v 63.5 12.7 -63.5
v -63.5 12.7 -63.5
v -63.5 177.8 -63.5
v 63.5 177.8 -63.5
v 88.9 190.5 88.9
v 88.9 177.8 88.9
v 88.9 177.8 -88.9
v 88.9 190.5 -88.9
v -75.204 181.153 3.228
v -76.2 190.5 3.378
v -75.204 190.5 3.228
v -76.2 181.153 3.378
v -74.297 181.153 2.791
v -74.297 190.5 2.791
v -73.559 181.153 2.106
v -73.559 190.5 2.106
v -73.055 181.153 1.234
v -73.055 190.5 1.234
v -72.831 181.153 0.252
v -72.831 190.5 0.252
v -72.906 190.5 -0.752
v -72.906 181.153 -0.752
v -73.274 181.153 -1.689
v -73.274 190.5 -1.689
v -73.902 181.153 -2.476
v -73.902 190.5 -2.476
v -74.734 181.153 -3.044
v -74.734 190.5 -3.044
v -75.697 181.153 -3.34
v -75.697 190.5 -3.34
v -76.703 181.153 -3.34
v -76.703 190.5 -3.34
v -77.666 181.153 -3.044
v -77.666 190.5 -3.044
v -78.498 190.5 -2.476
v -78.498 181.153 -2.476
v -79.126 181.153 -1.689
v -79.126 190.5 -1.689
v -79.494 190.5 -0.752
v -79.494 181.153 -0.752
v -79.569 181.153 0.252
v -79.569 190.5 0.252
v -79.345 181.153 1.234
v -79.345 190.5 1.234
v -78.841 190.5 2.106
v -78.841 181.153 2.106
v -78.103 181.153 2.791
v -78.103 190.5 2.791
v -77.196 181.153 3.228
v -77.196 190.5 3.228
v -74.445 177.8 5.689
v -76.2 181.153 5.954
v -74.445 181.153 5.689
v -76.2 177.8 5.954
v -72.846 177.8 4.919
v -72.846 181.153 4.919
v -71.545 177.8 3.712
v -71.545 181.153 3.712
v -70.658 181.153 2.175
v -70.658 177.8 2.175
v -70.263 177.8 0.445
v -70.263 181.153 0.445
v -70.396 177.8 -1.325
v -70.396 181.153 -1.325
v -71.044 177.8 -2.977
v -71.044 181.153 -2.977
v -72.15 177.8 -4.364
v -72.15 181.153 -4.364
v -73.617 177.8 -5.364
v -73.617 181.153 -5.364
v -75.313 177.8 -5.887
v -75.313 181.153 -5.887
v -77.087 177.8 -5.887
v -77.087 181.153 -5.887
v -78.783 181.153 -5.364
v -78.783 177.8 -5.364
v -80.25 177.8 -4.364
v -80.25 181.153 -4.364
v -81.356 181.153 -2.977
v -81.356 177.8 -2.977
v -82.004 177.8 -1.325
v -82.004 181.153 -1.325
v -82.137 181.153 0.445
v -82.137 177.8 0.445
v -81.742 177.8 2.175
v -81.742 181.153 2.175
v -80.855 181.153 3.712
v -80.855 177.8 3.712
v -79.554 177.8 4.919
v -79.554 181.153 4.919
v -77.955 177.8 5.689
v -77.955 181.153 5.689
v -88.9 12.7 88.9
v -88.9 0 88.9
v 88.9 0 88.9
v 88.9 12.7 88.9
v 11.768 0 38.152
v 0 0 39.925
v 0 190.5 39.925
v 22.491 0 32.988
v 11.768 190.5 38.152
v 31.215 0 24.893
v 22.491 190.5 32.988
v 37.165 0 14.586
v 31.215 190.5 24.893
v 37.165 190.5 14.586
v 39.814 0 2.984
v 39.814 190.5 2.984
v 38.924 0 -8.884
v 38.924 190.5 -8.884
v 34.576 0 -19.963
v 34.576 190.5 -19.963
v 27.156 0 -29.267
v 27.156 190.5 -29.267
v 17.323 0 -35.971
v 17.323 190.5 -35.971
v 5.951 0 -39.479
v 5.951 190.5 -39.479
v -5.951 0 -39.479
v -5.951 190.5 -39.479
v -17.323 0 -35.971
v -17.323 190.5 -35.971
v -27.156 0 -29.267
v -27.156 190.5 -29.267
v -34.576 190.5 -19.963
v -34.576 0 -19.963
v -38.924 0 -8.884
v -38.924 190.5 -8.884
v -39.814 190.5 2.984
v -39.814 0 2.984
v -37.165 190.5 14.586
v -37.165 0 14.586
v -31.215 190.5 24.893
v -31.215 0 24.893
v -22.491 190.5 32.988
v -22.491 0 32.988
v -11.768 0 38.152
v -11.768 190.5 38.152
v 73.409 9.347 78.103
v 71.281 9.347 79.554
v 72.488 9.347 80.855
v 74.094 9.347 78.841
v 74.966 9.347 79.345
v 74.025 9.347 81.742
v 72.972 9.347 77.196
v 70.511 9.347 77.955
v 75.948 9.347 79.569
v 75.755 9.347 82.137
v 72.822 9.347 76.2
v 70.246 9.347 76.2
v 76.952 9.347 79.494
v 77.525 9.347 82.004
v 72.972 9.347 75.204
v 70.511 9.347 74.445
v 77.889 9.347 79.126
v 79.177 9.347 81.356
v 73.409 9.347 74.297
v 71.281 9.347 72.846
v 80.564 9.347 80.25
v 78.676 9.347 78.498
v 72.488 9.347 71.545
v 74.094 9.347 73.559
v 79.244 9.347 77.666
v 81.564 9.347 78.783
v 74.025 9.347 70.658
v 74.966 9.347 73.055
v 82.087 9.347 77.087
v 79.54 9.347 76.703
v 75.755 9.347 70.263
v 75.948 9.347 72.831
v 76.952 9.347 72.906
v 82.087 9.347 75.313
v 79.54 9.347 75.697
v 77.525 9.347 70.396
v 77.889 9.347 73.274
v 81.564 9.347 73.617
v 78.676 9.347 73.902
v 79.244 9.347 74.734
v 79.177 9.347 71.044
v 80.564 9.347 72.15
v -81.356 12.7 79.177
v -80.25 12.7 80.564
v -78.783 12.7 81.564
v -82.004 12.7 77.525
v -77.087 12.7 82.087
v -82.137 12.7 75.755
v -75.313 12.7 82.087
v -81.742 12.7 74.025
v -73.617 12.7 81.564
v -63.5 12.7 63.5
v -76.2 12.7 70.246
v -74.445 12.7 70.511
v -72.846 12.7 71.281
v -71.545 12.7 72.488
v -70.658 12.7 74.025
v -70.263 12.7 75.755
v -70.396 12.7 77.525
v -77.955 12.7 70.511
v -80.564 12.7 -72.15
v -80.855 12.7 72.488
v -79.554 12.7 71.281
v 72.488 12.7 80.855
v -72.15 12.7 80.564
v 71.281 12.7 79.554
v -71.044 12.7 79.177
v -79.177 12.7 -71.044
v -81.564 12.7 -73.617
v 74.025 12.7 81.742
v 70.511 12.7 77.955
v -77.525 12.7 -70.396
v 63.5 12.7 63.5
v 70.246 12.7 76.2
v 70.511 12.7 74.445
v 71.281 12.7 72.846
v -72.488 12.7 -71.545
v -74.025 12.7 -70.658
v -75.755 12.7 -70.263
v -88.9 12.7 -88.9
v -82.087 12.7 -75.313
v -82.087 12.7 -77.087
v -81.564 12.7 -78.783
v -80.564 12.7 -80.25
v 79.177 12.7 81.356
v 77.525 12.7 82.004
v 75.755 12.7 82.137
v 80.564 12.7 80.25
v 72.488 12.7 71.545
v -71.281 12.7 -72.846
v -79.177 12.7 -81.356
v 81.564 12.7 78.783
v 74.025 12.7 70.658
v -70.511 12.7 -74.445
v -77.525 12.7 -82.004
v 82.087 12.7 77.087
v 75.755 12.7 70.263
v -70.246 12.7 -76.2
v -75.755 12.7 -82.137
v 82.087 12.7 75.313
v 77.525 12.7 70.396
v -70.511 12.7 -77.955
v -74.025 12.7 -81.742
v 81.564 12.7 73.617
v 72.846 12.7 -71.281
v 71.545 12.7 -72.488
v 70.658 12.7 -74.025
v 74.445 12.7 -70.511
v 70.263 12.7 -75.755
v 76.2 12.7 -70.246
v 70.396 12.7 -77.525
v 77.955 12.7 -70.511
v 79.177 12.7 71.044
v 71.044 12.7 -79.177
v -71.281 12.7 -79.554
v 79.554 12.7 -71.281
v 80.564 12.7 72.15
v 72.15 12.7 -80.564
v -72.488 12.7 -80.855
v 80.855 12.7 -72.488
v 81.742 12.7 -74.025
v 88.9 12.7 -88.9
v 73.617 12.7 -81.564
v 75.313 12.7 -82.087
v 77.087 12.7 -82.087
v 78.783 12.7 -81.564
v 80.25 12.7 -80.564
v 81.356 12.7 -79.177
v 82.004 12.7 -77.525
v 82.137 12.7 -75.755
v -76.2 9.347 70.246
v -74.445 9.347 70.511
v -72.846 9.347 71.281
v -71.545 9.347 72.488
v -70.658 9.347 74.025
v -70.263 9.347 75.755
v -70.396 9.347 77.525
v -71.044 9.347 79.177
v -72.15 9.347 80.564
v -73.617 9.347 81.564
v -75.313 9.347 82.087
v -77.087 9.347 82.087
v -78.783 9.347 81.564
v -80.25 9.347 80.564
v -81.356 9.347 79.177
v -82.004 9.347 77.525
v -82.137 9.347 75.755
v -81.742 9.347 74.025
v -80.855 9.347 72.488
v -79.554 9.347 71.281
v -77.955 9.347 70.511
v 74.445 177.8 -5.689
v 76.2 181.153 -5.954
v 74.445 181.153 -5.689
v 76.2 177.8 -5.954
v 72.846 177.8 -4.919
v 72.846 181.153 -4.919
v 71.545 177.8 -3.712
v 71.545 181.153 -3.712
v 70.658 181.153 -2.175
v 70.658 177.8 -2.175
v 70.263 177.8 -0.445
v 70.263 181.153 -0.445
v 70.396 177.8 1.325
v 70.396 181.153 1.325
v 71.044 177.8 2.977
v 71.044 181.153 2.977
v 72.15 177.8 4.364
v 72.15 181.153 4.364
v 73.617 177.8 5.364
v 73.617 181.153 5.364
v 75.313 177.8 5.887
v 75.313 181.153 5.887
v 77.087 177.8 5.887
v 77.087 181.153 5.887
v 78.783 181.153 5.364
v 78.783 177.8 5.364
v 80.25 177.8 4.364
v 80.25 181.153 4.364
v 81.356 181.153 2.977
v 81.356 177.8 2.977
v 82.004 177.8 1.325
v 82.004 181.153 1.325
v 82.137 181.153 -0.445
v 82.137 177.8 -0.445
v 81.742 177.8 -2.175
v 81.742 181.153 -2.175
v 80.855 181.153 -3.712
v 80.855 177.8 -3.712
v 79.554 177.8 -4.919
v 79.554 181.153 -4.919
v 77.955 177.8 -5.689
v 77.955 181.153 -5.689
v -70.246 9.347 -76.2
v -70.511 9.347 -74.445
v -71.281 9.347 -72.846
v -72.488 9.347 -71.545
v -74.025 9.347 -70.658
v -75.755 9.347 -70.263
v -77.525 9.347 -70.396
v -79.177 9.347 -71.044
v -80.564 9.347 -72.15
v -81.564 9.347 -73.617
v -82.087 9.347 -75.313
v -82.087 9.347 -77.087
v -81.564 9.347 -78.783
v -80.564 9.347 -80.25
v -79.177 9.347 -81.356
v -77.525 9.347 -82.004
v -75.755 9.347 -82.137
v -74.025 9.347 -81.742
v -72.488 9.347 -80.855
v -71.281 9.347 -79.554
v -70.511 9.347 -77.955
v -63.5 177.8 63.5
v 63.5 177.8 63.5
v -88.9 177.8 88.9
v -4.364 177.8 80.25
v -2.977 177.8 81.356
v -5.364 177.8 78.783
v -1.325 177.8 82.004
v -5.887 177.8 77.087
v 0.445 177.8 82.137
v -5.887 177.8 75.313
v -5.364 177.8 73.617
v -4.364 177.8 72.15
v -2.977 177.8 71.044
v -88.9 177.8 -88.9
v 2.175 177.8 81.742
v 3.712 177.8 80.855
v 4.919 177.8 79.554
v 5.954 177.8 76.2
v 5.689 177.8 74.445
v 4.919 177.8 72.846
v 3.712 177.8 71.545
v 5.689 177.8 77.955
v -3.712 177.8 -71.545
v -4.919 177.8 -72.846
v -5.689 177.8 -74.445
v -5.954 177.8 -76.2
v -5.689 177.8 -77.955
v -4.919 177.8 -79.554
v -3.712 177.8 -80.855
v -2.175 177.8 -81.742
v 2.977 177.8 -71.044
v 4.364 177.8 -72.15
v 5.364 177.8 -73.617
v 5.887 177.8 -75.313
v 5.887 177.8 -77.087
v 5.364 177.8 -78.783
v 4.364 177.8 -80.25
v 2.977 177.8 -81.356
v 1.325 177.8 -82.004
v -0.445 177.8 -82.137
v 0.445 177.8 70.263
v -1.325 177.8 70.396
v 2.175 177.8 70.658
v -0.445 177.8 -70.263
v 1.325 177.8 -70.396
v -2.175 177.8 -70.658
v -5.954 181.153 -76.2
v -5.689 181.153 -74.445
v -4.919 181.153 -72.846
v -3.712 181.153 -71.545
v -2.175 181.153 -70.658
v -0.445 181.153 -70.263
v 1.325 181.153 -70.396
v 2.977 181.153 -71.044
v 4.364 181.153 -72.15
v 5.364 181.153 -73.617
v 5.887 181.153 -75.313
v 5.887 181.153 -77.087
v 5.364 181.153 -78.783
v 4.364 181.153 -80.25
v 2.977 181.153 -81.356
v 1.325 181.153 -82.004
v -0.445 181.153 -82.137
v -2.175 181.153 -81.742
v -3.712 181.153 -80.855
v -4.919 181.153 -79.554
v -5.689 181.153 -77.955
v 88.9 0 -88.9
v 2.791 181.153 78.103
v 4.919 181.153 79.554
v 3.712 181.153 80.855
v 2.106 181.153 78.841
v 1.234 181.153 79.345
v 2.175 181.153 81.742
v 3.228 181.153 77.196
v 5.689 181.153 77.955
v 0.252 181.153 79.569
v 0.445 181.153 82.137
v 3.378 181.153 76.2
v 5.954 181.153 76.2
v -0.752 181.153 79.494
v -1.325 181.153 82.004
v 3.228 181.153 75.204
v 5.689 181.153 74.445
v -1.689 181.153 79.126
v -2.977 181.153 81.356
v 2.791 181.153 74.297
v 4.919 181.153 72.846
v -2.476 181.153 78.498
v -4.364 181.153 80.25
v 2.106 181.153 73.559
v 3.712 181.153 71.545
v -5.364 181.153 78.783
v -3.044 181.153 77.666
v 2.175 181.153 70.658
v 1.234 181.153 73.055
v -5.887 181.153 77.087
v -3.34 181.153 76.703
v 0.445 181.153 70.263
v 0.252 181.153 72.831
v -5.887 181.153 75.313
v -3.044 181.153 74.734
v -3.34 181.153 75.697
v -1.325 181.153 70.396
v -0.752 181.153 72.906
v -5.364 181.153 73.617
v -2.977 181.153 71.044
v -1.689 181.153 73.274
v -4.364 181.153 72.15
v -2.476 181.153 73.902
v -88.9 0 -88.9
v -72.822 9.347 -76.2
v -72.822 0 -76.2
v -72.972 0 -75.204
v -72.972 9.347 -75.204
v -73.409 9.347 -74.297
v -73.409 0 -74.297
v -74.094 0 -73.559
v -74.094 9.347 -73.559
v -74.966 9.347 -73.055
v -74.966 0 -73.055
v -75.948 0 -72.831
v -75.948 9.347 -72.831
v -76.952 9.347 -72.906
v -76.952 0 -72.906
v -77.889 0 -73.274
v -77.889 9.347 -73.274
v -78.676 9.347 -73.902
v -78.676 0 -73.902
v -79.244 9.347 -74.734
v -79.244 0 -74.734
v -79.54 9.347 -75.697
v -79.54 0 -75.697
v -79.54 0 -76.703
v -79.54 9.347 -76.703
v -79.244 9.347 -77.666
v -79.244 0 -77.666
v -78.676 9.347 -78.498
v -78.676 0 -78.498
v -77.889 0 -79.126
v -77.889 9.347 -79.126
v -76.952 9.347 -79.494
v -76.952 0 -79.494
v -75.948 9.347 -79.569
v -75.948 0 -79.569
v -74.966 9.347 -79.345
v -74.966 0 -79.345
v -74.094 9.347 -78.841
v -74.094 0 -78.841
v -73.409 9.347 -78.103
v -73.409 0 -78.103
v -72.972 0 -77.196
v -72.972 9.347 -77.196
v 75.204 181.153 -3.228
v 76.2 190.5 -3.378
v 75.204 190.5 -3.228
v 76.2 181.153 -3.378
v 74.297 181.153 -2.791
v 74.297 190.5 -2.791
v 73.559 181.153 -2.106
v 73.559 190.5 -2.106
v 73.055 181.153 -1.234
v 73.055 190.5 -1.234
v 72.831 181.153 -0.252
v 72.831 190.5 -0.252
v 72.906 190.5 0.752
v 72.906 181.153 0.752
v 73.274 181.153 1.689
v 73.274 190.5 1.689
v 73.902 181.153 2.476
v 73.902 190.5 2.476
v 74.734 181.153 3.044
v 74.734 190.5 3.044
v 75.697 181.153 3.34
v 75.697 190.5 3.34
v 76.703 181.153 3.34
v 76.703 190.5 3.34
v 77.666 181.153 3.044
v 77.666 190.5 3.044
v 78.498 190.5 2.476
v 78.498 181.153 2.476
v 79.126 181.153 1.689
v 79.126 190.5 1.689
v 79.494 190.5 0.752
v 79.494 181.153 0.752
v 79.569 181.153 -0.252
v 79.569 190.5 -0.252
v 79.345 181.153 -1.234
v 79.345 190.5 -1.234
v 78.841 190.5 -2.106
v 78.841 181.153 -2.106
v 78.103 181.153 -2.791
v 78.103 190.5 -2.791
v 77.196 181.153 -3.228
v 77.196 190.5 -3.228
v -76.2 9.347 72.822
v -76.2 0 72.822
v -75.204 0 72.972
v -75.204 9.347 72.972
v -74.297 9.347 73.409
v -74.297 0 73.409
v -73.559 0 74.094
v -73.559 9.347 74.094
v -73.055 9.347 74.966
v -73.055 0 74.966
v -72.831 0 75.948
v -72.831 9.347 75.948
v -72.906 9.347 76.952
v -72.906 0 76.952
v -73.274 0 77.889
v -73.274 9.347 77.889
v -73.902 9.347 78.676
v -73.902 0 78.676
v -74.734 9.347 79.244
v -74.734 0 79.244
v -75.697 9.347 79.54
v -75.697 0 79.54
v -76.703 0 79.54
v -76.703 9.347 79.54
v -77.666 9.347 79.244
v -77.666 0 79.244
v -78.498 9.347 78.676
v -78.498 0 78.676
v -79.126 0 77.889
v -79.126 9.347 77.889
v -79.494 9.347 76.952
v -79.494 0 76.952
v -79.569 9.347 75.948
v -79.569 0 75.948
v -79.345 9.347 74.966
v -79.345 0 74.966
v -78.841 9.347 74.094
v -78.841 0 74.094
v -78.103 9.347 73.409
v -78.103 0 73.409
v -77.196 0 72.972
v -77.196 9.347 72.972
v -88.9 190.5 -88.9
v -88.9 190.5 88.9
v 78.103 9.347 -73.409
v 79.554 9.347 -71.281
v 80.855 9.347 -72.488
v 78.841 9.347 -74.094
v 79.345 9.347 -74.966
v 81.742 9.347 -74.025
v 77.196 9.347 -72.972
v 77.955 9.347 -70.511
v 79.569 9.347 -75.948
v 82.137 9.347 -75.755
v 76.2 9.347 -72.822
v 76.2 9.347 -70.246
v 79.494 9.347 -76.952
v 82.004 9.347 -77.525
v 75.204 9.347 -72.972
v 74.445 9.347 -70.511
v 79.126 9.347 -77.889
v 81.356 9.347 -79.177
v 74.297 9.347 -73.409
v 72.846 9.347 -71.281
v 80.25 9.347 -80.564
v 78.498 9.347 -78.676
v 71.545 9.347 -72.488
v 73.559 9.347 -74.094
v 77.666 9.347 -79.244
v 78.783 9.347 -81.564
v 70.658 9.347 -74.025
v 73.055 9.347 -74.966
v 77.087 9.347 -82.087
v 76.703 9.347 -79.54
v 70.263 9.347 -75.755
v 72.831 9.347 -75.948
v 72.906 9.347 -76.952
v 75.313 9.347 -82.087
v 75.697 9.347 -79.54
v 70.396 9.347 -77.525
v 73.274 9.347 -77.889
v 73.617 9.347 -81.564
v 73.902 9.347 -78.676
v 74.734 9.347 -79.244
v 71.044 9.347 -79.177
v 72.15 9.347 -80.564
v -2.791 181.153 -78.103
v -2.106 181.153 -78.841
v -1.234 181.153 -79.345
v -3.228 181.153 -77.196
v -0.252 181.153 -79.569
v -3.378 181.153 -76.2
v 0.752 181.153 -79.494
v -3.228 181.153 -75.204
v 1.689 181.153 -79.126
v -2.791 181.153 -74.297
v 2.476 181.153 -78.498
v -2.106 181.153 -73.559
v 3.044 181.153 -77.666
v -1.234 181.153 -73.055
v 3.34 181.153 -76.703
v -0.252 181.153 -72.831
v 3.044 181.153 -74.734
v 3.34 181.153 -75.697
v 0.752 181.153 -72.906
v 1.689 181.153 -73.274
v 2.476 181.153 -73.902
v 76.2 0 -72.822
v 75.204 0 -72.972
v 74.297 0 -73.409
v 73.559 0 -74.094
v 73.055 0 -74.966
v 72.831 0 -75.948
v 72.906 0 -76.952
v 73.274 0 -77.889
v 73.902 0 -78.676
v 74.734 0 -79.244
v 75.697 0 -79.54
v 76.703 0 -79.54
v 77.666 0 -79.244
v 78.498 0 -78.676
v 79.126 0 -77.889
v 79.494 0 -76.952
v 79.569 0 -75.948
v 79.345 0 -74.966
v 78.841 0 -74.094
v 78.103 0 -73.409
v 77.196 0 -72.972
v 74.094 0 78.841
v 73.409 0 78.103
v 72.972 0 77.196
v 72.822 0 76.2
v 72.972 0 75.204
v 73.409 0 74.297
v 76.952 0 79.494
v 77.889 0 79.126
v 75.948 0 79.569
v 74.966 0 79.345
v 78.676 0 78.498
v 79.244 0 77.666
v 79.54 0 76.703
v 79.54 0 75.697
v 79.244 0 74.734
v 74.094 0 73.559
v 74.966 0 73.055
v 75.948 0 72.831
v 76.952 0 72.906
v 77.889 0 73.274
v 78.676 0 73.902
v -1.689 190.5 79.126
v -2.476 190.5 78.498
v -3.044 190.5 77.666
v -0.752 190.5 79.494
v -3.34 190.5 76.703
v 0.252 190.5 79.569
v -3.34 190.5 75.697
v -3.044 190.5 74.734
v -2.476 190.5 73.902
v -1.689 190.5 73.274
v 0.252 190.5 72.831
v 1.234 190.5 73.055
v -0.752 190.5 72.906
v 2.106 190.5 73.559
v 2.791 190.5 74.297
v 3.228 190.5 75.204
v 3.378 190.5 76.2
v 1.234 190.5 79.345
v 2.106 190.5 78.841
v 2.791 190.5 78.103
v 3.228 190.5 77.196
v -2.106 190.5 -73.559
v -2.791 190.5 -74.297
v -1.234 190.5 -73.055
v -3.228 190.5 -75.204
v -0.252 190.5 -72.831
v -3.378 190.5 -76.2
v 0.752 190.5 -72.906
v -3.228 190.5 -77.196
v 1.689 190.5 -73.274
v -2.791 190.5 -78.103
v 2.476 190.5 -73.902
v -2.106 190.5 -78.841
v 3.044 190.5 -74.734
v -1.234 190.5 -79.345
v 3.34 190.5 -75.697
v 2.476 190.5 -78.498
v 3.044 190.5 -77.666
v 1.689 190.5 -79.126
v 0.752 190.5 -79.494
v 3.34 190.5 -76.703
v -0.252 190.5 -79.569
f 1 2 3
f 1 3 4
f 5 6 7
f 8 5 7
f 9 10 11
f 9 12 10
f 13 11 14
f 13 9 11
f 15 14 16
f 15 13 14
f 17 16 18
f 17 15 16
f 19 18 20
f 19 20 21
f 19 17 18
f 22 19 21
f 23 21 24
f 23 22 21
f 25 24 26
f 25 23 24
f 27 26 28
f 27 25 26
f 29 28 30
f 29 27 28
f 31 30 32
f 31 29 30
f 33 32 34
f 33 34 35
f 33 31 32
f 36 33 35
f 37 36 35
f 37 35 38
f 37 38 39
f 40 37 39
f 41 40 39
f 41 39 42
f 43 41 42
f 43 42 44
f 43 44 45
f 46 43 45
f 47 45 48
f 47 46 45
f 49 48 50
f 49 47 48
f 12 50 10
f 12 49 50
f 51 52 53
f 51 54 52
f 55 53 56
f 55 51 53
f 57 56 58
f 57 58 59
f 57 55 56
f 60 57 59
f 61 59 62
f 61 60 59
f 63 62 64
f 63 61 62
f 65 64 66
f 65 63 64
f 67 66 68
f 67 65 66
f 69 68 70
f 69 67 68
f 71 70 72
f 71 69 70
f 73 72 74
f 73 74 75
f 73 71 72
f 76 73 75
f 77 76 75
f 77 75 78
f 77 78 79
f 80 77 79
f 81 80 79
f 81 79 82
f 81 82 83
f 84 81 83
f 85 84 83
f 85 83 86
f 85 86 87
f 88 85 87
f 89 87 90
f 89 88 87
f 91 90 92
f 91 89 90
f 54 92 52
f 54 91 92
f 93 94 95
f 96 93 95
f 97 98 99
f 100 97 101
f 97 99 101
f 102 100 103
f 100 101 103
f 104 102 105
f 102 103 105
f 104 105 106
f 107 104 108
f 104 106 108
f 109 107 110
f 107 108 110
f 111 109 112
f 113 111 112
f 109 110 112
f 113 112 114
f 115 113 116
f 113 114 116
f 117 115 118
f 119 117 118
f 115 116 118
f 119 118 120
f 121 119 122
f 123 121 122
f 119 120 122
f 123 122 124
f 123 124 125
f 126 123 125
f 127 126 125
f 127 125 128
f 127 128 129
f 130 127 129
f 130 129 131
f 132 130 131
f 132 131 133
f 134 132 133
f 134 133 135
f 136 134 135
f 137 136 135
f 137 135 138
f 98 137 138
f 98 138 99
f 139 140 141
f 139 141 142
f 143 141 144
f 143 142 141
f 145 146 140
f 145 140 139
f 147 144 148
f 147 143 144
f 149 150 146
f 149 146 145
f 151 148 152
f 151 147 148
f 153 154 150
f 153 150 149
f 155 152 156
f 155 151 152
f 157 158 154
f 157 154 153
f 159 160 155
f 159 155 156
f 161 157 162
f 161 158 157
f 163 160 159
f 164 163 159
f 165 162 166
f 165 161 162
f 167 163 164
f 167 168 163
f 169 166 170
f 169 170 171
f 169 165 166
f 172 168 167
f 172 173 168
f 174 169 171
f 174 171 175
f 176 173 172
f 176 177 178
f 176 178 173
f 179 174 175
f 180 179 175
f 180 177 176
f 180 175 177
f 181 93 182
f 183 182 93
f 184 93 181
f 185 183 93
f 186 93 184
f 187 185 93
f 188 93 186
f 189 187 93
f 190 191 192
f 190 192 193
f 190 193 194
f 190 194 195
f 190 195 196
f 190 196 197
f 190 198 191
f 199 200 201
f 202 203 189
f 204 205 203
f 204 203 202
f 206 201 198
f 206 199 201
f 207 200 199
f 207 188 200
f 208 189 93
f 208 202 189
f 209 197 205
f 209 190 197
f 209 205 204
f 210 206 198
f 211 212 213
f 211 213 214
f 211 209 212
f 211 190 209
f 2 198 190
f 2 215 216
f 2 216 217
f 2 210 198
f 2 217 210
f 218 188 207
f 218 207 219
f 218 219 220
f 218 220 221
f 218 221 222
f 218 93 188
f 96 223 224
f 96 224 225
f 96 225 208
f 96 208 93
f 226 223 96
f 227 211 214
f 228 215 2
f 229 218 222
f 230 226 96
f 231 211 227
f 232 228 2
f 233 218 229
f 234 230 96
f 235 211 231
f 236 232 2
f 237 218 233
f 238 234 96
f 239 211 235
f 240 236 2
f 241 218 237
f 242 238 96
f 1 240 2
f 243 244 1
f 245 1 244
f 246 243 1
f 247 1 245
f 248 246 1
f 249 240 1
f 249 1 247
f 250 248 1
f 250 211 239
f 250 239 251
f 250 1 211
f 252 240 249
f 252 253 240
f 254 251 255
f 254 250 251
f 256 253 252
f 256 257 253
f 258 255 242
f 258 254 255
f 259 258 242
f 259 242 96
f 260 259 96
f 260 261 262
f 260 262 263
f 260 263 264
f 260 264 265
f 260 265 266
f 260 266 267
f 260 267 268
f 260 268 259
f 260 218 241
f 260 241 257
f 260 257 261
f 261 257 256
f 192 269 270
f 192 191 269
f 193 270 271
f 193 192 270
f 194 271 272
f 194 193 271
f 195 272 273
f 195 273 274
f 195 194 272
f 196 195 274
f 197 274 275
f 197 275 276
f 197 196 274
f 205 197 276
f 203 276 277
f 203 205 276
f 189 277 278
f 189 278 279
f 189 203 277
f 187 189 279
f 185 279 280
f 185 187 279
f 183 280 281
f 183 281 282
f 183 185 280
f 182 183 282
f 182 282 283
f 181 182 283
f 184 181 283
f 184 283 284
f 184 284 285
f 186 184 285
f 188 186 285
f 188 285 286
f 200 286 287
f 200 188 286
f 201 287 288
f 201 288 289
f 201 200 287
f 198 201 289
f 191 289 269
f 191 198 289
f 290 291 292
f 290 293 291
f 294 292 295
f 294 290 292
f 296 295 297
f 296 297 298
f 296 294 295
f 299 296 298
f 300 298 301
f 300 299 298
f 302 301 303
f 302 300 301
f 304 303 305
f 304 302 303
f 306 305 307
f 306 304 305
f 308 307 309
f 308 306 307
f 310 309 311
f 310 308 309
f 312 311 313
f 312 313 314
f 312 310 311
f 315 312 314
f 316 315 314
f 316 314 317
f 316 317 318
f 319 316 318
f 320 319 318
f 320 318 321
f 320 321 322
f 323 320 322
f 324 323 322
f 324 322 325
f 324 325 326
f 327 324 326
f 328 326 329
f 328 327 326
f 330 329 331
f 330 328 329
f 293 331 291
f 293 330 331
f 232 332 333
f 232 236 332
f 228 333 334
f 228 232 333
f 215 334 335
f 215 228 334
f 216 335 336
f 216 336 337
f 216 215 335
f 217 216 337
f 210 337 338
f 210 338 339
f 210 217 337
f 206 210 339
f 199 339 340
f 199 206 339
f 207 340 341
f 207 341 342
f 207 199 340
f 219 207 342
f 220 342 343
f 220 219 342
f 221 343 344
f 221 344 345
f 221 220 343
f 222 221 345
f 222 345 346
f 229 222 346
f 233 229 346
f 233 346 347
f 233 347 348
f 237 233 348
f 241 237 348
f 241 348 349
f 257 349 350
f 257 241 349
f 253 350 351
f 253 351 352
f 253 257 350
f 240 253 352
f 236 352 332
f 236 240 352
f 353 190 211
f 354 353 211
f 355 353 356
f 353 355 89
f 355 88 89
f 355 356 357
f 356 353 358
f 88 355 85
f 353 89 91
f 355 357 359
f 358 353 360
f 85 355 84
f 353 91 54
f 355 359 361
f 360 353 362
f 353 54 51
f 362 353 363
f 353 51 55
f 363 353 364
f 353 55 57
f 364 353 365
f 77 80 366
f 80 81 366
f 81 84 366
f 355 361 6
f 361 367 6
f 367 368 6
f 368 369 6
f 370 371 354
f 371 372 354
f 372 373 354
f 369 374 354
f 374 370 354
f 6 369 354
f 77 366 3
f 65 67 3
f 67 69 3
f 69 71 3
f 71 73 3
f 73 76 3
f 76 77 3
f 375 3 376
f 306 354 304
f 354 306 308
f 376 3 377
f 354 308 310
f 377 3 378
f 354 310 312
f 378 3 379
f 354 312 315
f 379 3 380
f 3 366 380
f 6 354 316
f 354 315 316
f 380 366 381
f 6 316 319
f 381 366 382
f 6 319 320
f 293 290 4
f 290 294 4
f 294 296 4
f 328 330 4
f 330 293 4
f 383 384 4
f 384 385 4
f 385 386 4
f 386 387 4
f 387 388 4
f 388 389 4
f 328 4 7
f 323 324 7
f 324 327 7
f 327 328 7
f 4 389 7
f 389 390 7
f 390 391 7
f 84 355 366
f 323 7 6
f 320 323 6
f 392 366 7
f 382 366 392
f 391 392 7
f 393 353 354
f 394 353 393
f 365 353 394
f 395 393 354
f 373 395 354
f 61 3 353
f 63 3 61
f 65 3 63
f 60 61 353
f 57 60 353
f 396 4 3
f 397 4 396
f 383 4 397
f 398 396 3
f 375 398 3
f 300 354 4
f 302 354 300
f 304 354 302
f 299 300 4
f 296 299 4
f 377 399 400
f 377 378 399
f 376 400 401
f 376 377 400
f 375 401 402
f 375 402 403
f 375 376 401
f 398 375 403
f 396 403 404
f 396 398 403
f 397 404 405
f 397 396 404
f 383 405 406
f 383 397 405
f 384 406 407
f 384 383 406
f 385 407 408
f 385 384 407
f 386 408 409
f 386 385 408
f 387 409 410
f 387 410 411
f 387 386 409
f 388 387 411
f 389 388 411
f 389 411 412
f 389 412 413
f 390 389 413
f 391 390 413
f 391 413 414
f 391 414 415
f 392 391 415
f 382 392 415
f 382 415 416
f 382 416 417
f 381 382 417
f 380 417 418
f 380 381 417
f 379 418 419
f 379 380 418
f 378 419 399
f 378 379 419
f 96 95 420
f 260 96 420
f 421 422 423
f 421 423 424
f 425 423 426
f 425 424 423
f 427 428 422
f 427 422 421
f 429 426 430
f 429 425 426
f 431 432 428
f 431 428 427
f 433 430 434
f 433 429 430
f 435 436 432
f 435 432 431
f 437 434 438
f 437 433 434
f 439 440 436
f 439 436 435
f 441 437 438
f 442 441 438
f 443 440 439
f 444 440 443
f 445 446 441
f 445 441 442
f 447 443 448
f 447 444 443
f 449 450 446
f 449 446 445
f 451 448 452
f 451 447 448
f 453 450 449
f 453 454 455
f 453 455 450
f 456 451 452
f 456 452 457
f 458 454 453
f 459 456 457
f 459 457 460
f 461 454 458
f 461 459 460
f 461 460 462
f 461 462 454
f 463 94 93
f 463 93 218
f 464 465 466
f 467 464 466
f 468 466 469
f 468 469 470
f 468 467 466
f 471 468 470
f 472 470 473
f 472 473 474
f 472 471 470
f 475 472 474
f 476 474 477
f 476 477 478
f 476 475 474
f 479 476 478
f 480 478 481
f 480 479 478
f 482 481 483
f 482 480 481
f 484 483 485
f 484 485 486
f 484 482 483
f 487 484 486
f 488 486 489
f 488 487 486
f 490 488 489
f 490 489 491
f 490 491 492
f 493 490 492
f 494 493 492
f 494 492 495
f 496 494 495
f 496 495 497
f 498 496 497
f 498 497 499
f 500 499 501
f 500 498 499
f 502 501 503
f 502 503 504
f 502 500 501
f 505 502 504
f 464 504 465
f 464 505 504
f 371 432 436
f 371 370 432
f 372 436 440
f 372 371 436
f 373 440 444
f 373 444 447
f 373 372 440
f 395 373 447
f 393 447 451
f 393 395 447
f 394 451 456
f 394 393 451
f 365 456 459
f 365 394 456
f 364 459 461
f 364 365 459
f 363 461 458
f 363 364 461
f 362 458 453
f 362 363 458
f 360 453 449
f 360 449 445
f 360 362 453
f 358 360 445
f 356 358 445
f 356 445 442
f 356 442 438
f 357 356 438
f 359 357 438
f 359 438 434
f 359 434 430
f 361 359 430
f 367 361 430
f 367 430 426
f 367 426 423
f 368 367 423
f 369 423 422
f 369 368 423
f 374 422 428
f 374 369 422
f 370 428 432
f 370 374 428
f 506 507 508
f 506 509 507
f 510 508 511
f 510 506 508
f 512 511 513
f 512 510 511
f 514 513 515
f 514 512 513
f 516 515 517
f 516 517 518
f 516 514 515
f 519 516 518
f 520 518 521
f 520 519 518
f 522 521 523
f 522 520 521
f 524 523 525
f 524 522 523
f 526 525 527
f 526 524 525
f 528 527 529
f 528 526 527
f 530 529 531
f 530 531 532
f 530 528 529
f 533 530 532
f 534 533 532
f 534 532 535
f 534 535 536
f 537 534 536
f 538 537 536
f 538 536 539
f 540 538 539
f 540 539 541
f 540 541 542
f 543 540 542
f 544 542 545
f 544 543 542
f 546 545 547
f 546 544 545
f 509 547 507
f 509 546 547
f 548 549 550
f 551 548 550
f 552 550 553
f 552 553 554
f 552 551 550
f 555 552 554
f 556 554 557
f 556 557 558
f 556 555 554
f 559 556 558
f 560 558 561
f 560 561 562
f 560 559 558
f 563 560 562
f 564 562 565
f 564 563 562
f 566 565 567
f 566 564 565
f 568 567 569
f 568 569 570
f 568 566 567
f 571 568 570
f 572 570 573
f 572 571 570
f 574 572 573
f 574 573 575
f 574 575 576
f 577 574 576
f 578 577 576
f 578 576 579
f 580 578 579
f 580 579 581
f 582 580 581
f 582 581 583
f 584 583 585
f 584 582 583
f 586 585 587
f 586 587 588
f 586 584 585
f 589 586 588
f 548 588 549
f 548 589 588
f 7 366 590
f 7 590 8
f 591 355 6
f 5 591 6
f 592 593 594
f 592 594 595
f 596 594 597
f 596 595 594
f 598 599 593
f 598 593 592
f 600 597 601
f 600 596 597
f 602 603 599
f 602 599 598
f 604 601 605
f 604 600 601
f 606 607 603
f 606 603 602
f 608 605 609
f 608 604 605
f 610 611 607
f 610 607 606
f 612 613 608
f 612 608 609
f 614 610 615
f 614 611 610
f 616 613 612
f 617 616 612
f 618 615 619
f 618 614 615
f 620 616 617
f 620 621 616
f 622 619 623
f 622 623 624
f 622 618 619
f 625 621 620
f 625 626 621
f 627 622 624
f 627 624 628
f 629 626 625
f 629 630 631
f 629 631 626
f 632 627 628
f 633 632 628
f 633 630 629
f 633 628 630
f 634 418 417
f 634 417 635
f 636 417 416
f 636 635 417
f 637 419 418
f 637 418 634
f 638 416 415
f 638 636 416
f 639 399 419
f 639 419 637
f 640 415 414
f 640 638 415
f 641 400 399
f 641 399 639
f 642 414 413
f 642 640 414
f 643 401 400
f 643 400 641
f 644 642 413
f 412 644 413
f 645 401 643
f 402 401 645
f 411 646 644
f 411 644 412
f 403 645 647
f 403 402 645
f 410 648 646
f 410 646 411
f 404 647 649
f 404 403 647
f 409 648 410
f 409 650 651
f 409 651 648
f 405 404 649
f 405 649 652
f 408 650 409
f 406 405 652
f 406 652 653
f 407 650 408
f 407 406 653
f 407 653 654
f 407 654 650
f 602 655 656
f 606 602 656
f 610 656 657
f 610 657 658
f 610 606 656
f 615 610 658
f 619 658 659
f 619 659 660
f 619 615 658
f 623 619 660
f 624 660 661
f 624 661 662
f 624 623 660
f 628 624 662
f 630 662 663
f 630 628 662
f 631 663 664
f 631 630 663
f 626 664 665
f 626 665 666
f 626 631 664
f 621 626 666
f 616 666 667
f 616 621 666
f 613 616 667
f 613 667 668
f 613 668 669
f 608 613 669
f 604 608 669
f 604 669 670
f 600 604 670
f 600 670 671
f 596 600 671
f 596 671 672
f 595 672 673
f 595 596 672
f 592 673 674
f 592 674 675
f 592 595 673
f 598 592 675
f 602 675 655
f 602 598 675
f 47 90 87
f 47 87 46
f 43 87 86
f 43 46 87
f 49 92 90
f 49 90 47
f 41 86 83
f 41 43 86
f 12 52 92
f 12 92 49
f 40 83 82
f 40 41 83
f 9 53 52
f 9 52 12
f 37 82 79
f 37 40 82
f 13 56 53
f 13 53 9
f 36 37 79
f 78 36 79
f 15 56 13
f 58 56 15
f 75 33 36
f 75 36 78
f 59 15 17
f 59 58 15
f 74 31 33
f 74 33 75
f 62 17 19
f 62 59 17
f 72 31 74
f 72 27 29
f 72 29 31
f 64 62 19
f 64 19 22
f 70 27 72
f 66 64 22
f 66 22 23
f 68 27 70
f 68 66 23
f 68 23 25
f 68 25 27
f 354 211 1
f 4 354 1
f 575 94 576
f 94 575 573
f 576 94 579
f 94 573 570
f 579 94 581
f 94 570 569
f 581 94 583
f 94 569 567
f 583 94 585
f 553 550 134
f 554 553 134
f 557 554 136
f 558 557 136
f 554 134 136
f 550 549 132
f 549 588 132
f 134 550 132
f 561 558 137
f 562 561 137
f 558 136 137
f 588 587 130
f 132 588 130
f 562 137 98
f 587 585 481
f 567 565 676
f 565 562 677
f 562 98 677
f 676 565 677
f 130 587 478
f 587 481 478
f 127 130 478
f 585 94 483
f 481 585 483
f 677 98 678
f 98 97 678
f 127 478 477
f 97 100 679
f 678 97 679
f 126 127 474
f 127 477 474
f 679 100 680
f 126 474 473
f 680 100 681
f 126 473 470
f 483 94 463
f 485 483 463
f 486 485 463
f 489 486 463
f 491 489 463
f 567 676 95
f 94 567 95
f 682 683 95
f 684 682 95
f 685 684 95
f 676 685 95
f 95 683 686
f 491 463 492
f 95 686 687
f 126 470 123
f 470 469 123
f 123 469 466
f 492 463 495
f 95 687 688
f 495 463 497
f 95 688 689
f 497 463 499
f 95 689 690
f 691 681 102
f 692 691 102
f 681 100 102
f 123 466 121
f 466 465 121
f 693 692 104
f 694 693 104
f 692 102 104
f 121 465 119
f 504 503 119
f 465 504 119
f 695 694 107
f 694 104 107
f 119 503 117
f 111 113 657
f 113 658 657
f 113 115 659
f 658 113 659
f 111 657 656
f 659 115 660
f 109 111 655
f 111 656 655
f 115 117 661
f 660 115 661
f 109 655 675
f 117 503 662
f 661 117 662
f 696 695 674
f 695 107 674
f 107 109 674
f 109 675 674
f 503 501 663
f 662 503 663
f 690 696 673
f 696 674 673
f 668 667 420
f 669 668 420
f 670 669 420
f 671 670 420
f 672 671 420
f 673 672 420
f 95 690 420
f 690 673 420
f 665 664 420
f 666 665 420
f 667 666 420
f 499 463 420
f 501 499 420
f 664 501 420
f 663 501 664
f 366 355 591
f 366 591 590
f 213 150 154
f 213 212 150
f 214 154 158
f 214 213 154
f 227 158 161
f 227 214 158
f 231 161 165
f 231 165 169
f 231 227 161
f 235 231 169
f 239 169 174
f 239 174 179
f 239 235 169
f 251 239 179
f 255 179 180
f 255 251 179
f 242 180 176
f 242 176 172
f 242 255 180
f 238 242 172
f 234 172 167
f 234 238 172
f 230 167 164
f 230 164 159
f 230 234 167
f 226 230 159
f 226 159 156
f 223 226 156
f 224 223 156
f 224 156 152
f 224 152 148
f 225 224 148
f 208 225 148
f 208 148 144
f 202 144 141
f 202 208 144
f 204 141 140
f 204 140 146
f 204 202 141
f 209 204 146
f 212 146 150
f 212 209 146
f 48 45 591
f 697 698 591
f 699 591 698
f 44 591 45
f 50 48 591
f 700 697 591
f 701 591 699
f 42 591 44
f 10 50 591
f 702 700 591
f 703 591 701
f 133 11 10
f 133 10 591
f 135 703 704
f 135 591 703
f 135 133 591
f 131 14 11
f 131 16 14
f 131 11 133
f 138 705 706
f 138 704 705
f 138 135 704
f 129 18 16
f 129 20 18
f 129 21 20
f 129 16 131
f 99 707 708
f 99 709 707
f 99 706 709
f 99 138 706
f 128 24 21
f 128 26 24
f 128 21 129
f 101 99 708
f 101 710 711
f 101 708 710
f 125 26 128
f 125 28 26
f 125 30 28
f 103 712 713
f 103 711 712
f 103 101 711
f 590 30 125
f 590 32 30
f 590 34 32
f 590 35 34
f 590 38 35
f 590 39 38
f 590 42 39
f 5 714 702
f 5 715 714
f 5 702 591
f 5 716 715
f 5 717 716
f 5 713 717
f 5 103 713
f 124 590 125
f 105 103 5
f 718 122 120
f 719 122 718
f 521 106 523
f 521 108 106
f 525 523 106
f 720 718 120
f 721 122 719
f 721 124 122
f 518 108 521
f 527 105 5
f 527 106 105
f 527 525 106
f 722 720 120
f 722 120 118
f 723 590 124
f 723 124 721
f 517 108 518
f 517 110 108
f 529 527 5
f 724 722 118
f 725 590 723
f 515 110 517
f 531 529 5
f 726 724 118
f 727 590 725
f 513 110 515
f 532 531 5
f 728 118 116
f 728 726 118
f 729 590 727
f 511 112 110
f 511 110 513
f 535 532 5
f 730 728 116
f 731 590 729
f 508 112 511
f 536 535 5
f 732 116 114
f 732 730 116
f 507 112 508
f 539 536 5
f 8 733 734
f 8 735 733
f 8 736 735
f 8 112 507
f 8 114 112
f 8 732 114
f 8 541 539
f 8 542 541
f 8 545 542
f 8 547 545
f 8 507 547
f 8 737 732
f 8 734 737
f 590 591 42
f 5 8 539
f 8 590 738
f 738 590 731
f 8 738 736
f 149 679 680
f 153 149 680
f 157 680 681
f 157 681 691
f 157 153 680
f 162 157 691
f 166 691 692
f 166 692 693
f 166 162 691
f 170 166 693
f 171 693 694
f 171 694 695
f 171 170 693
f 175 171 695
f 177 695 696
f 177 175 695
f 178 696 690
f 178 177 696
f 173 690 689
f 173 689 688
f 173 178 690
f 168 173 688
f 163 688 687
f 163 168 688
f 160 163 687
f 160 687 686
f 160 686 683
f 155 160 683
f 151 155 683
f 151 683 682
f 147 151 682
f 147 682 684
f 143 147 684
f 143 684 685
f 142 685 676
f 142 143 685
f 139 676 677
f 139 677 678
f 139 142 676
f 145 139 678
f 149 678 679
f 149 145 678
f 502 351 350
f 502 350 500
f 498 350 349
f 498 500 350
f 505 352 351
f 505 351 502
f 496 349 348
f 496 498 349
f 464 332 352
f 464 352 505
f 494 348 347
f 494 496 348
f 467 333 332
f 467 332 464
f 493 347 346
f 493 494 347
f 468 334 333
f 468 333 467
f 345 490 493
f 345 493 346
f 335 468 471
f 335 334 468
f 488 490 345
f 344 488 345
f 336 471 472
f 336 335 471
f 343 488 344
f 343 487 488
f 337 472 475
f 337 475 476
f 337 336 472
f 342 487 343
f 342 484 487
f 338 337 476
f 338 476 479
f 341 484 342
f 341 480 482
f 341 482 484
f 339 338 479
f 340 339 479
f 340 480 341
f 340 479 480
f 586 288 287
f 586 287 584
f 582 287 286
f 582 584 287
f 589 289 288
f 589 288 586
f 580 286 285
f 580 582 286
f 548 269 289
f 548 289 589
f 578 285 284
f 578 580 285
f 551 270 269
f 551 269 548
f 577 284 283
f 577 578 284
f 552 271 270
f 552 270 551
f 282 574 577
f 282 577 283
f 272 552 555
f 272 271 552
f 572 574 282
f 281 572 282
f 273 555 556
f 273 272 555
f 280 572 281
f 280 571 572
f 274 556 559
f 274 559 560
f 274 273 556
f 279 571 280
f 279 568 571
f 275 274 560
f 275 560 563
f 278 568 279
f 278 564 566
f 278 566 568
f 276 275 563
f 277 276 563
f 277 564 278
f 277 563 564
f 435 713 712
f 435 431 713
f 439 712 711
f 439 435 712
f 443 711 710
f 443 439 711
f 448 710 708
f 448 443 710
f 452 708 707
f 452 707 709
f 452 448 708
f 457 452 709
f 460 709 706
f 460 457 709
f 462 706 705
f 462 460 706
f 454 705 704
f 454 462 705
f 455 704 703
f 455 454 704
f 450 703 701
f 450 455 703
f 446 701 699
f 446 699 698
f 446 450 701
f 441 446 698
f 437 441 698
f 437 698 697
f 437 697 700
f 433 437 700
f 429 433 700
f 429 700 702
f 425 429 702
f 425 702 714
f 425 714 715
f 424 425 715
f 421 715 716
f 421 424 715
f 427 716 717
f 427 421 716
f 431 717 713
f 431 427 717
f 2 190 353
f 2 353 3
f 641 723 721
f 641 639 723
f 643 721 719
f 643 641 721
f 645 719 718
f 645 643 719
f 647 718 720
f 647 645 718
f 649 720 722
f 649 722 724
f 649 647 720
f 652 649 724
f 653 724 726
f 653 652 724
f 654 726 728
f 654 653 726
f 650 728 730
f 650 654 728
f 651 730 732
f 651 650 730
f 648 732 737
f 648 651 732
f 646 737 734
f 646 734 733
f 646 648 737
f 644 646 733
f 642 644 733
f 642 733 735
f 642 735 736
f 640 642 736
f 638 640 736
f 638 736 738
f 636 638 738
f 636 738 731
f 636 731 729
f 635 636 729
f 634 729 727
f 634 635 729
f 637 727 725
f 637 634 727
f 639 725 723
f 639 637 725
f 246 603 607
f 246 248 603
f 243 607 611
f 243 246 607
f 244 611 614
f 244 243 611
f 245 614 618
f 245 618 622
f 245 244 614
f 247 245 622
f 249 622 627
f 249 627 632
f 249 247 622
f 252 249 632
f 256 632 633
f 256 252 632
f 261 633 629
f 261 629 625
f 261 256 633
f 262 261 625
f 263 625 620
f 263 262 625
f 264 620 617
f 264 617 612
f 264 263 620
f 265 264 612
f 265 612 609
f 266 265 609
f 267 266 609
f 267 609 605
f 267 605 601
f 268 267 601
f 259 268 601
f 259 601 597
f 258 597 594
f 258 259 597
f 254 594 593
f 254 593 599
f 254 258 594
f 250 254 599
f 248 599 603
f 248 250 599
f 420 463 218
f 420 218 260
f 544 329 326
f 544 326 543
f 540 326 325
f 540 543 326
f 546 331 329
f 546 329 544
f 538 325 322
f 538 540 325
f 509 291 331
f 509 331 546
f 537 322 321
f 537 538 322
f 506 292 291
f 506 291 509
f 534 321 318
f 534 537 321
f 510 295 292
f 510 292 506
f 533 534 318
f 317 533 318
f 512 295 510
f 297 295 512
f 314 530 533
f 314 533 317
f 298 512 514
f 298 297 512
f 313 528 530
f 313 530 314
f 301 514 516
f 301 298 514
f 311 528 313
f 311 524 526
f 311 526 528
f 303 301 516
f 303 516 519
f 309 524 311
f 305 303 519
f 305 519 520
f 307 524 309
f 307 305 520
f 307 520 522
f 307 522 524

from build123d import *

# Parameters (mm, degrees)
SKETCH1_W           = 177.8
SKETCH1_H           = 177.8
BOSS_EXTRUDE1_DEPTH = 12.7
LPATTERN1_COUNT     = 2
LPATTERN1_PITCH     = 177.8
CIRPATTERN1_COUNT   = 4
CIRPATTERN2_COUNT   = 4
BOSS_EXTRUDE2_REACH = 219.76
SKETCH11_W          = 127
SKETCH11_H          = 127
SKETCH12_R          = 39.925273759
CUT_EXTRUDE1_DEPTH  = 229.246949596


with BuildPart() as part:
    # Sketch1 → Boss-Extrude1 (new body)
    with BuildSketch(Plane(origin=(0, 0, 0), x_dir=(1, 0, 0), z_dir=(0, 1, 0))):
        Rectangle(SKETCH1_W, SKETCH1_H)
    extrude(amount=BOSS_EXTRUDE1_DEPTH)


with BuildPart() as lpattern1_1:
    # LPattern1: pattern copy
    add(part.part.moved(Location(Vector(0, 1, 0) * (1 * LPATTERN1_PITCH))))

    # Sketch10 → CBORE for 1/4 Button Head Cap Screw2 (revolve, cut)
    with BuildSketch(Plane(origin=(76.2, 177.8, 0), x_dir=(0, 0, -1), z_dir=(1, 0, 0))):
        Polygon((0, 0), (0, 12.7), (3.3782, 12.7), (3.3782, 3.3528), (5.95376, 3.3528), (5.95376, 0), align=None)
    cbore_for_1_4_button_head_cap_screw2 = revolve(axis=Axis((76.2, 171.45, 0), (0, 1, 0)), mode=Mode.SUBTRACT)

    # CirPattern2: CBORE for 1/4 Button Head Cap Screw2 ×4 about axis
    cirpattern2_axis = Axis((0, -0.635, 0), (0, 1, 0))
    for i in range(1, CIRPATTERN2_COUNT):
        add(cbore_for_1_4_button_head_cap_screw2.rotate(cirpattern2_axis, i * 360 / CIRPATTERN2_COUNT), mode=Mode.SUBTRACT)

    # Sketch11 → Boss-Extrude2 (add, up to next)
    with BuildSketch(Plane(origin=(0, 12.7, 0), x_dir=(1, 0, 0), z_dir=(0, 1, 0)), mode=Mode.PRIVATE) as boss_extrude2_sk1:
        Rectangle(SKETCH11_W, SKETCH11_H)
    boss_extrude2_tool1 = extrude(boss_extrude2_sk1.sketch, amount=BOSS_EXTRUDE2_REACH, mode=Mode.PRIVATE) - lpattern1_1.part


with BuildPart() as part_1:
    add(part.part)

    # Sketch5 → CBORE for 1/4 Button Head Cap Screw1 (revolve, cut)
    with BuildSketch(Plane(origin=(76.2, 12.7, -76.2), x_dir=(0, 0, 1), z_dir=(1, 0, 0))):
        Polygon((0, 0), (0, 12.7), (3.3782, 12.7), (3.3782, 3.3528), (5.95376, 3.3528), (5.95376, 0), align=None)
    cbore_for_1_4_button_head_cap_screw1 = revolve(axis=Axis((76.2, 19.05, -76.2), (0, -1, 0)), mode=Mode.SUBTRACT)

    # CirPattern1: CBORE for 1/4 Button Head Cap Screw1 ×4 about axis
    cirpattern1_axis = Axis((0, -0.635, 0), (0, 1, 0))
    for i in range(1, CIRPATTERN1_COUNT):
        add(cbore_for_1_4_button_head_cap_screw1.rotate(cirpattern1_axis, i * 360 / CIRPATTERN1_COUNT), mode=Mode.SUBTRACT)


with BuildPart() as lpattern1_1_1:
    add(lpattern1_1.part)

    add(part_1.part)  # Boss-Extrude2 merges part
    add(boss_extrude2_tool1.solids().sort_by_distance((0, 12.7, 0))[0])

    # Sketch12 → Cut-Extrude1 (cut, through all)
    with BuildSketch(Plane(origin=(0, 190.5, 0), x_dir=(1, 0, 0), z_dir=(0, 1, 0))):
        Circle(SKETCH12_R)
    extrude(amount=-CUT_EXTRUDE1_DEPTH, mode=Mode.SUBTRACT)


solid = lpattern1_1_1.part
